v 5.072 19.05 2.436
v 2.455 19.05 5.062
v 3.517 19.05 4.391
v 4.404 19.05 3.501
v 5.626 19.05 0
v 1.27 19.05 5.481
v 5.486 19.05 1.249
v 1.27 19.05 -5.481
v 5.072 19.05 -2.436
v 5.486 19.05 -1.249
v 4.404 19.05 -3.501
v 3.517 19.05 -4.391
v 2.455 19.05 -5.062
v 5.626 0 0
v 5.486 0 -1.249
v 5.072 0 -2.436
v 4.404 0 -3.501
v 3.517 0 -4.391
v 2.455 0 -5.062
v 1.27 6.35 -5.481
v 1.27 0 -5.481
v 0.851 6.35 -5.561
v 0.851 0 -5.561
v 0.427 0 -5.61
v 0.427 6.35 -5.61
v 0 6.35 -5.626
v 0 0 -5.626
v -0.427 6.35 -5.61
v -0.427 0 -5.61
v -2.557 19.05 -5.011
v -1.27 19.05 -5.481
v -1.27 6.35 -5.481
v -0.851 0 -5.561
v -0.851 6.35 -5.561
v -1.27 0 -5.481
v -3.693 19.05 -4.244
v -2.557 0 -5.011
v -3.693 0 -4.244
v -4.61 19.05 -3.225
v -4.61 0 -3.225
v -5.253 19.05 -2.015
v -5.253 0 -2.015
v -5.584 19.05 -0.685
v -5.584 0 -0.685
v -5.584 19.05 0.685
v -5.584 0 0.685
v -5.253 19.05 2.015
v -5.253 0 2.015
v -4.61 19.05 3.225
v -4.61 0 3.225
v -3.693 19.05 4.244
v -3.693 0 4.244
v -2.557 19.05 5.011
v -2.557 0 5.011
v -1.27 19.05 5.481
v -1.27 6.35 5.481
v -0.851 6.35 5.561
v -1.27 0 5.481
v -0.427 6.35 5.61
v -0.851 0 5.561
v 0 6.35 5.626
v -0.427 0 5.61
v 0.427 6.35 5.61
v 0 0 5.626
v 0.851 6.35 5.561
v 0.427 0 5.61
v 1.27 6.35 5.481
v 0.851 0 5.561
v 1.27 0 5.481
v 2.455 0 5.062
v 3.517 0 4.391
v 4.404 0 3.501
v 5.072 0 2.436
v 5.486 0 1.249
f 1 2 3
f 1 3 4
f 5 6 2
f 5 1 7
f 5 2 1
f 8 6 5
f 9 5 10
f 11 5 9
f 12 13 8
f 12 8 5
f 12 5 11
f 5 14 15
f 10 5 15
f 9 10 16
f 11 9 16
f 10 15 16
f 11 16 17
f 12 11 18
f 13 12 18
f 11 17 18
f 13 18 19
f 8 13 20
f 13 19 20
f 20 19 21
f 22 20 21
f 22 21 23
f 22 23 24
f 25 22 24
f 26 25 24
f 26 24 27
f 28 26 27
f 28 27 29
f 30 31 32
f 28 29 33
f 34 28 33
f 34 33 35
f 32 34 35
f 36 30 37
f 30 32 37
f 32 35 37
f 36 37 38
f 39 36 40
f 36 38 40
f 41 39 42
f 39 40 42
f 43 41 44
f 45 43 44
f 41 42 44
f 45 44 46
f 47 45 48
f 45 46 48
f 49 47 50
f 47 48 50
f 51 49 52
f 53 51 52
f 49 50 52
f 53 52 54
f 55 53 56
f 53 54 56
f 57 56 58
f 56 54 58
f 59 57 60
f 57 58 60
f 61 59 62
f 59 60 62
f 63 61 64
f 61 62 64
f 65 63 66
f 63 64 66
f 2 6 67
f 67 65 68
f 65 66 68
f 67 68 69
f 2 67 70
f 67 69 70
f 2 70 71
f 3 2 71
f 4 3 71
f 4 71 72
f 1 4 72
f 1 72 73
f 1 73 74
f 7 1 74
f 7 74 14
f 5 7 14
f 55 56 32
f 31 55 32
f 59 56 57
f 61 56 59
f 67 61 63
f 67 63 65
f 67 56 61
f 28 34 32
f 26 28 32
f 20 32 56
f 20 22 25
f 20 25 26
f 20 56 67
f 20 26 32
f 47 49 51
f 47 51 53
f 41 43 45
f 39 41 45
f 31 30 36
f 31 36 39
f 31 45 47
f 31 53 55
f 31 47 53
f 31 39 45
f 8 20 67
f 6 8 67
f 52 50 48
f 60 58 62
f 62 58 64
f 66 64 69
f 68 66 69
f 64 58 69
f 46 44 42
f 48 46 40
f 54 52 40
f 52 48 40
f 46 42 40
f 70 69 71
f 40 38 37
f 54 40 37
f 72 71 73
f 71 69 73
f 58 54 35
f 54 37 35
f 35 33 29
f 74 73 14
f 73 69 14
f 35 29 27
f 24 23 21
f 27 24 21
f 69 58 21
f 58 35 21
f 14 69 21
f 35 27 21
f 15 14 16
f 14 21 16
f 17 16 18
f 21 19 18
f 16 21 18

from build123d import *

# Parameters (mm, degrees)
BOSS_EXTRUDE1_DEPTH = 6.35
BOSS_EXTRUDE2_START = 6.35
BOSS_EXTRUDE2_DEPTH = 12.7


with BuildPart() as part:
    # Sketch1 → Boss-Extrude1 (new body)
    with BuildSketch(Plane(origin=(0, 0, 0), x_dir=(1, 0, 0), z_dir=(0, 1, 0))):
        with BuildLine():
            ThreePointArc((-1.27, 5.480885075), (-5.6261, 0), (-1.27, -5.480885075))
            Line((-1.27, -5.480885075), (-1.27, 5.480885075))
        make_face()
        with BuildLine():
            ThreePointArc((-1.27, -5.480885075), (-0.639137568, -5.589678379), (2.1e-08, -5.6261))
            ThreePointArc((2.1e-08, -5.6261), (0.639137588, -5.589678377), (1.27, -5.480885075))
            Line((1.27, -5.480885075), (1.27, 5.480885075))
            ThreePointArc((1.27, 5.480885075), (0.639137578, 5.589678378), (0, 5.6261))
            ThreePointArc((0, 5.6261), (-0.639137578, 5.589678378), (-1.27, 5.480885075))
            Line((-1.27, 5.480885075), (-1.27, -5.480885075))
        make_face()
        with BuildLine():
            Line((1.27, 5.480885075), (1.27, -5.480885075))
            ThreePointArc((1.27, -5.480885075), (4.404438001, -3.50056097), (5.6261, 0))
            ThreePointArc((5.6261, 0), (4.404438001, 3.50056097), (1.27, 5.480885075))
        make_face()
    extrude(amount=BOSS_EXTRUDE1_DEPTH)

    # Sketch1<3> → Boss-Extrude2 (add)
    with BuildSketch(Plane(origin=(0, 0, 0), x_dir=(1, 0, 0), z_dir=(0, 1, 0)).offset(BOSS_EXTRUDE2_START)):
        with BuildLine():
            ThreePointArc((-1.27, 5.480885075), (-5.6261, 0), (-1.27, -5.480885075))
            Line((-1.27, -5.480885075), (-1.27, 5.480885075))
        make_face()
        with BuildLine():
            Line((1.27, 5.480885075), (1.27, -5.480885075))
            ThreePointArc((1.27, -5.480885075), (4.404438001, -3.50056097), (5.6261, 0))
            ThreePointArc((5.6261, 0), (4.404438001, 3.50056097), (1.27, 5.480885075))
        make_face()
    extrude(amount=BOSS_EXTRUDE2_DEPTH)


solid = part.part
